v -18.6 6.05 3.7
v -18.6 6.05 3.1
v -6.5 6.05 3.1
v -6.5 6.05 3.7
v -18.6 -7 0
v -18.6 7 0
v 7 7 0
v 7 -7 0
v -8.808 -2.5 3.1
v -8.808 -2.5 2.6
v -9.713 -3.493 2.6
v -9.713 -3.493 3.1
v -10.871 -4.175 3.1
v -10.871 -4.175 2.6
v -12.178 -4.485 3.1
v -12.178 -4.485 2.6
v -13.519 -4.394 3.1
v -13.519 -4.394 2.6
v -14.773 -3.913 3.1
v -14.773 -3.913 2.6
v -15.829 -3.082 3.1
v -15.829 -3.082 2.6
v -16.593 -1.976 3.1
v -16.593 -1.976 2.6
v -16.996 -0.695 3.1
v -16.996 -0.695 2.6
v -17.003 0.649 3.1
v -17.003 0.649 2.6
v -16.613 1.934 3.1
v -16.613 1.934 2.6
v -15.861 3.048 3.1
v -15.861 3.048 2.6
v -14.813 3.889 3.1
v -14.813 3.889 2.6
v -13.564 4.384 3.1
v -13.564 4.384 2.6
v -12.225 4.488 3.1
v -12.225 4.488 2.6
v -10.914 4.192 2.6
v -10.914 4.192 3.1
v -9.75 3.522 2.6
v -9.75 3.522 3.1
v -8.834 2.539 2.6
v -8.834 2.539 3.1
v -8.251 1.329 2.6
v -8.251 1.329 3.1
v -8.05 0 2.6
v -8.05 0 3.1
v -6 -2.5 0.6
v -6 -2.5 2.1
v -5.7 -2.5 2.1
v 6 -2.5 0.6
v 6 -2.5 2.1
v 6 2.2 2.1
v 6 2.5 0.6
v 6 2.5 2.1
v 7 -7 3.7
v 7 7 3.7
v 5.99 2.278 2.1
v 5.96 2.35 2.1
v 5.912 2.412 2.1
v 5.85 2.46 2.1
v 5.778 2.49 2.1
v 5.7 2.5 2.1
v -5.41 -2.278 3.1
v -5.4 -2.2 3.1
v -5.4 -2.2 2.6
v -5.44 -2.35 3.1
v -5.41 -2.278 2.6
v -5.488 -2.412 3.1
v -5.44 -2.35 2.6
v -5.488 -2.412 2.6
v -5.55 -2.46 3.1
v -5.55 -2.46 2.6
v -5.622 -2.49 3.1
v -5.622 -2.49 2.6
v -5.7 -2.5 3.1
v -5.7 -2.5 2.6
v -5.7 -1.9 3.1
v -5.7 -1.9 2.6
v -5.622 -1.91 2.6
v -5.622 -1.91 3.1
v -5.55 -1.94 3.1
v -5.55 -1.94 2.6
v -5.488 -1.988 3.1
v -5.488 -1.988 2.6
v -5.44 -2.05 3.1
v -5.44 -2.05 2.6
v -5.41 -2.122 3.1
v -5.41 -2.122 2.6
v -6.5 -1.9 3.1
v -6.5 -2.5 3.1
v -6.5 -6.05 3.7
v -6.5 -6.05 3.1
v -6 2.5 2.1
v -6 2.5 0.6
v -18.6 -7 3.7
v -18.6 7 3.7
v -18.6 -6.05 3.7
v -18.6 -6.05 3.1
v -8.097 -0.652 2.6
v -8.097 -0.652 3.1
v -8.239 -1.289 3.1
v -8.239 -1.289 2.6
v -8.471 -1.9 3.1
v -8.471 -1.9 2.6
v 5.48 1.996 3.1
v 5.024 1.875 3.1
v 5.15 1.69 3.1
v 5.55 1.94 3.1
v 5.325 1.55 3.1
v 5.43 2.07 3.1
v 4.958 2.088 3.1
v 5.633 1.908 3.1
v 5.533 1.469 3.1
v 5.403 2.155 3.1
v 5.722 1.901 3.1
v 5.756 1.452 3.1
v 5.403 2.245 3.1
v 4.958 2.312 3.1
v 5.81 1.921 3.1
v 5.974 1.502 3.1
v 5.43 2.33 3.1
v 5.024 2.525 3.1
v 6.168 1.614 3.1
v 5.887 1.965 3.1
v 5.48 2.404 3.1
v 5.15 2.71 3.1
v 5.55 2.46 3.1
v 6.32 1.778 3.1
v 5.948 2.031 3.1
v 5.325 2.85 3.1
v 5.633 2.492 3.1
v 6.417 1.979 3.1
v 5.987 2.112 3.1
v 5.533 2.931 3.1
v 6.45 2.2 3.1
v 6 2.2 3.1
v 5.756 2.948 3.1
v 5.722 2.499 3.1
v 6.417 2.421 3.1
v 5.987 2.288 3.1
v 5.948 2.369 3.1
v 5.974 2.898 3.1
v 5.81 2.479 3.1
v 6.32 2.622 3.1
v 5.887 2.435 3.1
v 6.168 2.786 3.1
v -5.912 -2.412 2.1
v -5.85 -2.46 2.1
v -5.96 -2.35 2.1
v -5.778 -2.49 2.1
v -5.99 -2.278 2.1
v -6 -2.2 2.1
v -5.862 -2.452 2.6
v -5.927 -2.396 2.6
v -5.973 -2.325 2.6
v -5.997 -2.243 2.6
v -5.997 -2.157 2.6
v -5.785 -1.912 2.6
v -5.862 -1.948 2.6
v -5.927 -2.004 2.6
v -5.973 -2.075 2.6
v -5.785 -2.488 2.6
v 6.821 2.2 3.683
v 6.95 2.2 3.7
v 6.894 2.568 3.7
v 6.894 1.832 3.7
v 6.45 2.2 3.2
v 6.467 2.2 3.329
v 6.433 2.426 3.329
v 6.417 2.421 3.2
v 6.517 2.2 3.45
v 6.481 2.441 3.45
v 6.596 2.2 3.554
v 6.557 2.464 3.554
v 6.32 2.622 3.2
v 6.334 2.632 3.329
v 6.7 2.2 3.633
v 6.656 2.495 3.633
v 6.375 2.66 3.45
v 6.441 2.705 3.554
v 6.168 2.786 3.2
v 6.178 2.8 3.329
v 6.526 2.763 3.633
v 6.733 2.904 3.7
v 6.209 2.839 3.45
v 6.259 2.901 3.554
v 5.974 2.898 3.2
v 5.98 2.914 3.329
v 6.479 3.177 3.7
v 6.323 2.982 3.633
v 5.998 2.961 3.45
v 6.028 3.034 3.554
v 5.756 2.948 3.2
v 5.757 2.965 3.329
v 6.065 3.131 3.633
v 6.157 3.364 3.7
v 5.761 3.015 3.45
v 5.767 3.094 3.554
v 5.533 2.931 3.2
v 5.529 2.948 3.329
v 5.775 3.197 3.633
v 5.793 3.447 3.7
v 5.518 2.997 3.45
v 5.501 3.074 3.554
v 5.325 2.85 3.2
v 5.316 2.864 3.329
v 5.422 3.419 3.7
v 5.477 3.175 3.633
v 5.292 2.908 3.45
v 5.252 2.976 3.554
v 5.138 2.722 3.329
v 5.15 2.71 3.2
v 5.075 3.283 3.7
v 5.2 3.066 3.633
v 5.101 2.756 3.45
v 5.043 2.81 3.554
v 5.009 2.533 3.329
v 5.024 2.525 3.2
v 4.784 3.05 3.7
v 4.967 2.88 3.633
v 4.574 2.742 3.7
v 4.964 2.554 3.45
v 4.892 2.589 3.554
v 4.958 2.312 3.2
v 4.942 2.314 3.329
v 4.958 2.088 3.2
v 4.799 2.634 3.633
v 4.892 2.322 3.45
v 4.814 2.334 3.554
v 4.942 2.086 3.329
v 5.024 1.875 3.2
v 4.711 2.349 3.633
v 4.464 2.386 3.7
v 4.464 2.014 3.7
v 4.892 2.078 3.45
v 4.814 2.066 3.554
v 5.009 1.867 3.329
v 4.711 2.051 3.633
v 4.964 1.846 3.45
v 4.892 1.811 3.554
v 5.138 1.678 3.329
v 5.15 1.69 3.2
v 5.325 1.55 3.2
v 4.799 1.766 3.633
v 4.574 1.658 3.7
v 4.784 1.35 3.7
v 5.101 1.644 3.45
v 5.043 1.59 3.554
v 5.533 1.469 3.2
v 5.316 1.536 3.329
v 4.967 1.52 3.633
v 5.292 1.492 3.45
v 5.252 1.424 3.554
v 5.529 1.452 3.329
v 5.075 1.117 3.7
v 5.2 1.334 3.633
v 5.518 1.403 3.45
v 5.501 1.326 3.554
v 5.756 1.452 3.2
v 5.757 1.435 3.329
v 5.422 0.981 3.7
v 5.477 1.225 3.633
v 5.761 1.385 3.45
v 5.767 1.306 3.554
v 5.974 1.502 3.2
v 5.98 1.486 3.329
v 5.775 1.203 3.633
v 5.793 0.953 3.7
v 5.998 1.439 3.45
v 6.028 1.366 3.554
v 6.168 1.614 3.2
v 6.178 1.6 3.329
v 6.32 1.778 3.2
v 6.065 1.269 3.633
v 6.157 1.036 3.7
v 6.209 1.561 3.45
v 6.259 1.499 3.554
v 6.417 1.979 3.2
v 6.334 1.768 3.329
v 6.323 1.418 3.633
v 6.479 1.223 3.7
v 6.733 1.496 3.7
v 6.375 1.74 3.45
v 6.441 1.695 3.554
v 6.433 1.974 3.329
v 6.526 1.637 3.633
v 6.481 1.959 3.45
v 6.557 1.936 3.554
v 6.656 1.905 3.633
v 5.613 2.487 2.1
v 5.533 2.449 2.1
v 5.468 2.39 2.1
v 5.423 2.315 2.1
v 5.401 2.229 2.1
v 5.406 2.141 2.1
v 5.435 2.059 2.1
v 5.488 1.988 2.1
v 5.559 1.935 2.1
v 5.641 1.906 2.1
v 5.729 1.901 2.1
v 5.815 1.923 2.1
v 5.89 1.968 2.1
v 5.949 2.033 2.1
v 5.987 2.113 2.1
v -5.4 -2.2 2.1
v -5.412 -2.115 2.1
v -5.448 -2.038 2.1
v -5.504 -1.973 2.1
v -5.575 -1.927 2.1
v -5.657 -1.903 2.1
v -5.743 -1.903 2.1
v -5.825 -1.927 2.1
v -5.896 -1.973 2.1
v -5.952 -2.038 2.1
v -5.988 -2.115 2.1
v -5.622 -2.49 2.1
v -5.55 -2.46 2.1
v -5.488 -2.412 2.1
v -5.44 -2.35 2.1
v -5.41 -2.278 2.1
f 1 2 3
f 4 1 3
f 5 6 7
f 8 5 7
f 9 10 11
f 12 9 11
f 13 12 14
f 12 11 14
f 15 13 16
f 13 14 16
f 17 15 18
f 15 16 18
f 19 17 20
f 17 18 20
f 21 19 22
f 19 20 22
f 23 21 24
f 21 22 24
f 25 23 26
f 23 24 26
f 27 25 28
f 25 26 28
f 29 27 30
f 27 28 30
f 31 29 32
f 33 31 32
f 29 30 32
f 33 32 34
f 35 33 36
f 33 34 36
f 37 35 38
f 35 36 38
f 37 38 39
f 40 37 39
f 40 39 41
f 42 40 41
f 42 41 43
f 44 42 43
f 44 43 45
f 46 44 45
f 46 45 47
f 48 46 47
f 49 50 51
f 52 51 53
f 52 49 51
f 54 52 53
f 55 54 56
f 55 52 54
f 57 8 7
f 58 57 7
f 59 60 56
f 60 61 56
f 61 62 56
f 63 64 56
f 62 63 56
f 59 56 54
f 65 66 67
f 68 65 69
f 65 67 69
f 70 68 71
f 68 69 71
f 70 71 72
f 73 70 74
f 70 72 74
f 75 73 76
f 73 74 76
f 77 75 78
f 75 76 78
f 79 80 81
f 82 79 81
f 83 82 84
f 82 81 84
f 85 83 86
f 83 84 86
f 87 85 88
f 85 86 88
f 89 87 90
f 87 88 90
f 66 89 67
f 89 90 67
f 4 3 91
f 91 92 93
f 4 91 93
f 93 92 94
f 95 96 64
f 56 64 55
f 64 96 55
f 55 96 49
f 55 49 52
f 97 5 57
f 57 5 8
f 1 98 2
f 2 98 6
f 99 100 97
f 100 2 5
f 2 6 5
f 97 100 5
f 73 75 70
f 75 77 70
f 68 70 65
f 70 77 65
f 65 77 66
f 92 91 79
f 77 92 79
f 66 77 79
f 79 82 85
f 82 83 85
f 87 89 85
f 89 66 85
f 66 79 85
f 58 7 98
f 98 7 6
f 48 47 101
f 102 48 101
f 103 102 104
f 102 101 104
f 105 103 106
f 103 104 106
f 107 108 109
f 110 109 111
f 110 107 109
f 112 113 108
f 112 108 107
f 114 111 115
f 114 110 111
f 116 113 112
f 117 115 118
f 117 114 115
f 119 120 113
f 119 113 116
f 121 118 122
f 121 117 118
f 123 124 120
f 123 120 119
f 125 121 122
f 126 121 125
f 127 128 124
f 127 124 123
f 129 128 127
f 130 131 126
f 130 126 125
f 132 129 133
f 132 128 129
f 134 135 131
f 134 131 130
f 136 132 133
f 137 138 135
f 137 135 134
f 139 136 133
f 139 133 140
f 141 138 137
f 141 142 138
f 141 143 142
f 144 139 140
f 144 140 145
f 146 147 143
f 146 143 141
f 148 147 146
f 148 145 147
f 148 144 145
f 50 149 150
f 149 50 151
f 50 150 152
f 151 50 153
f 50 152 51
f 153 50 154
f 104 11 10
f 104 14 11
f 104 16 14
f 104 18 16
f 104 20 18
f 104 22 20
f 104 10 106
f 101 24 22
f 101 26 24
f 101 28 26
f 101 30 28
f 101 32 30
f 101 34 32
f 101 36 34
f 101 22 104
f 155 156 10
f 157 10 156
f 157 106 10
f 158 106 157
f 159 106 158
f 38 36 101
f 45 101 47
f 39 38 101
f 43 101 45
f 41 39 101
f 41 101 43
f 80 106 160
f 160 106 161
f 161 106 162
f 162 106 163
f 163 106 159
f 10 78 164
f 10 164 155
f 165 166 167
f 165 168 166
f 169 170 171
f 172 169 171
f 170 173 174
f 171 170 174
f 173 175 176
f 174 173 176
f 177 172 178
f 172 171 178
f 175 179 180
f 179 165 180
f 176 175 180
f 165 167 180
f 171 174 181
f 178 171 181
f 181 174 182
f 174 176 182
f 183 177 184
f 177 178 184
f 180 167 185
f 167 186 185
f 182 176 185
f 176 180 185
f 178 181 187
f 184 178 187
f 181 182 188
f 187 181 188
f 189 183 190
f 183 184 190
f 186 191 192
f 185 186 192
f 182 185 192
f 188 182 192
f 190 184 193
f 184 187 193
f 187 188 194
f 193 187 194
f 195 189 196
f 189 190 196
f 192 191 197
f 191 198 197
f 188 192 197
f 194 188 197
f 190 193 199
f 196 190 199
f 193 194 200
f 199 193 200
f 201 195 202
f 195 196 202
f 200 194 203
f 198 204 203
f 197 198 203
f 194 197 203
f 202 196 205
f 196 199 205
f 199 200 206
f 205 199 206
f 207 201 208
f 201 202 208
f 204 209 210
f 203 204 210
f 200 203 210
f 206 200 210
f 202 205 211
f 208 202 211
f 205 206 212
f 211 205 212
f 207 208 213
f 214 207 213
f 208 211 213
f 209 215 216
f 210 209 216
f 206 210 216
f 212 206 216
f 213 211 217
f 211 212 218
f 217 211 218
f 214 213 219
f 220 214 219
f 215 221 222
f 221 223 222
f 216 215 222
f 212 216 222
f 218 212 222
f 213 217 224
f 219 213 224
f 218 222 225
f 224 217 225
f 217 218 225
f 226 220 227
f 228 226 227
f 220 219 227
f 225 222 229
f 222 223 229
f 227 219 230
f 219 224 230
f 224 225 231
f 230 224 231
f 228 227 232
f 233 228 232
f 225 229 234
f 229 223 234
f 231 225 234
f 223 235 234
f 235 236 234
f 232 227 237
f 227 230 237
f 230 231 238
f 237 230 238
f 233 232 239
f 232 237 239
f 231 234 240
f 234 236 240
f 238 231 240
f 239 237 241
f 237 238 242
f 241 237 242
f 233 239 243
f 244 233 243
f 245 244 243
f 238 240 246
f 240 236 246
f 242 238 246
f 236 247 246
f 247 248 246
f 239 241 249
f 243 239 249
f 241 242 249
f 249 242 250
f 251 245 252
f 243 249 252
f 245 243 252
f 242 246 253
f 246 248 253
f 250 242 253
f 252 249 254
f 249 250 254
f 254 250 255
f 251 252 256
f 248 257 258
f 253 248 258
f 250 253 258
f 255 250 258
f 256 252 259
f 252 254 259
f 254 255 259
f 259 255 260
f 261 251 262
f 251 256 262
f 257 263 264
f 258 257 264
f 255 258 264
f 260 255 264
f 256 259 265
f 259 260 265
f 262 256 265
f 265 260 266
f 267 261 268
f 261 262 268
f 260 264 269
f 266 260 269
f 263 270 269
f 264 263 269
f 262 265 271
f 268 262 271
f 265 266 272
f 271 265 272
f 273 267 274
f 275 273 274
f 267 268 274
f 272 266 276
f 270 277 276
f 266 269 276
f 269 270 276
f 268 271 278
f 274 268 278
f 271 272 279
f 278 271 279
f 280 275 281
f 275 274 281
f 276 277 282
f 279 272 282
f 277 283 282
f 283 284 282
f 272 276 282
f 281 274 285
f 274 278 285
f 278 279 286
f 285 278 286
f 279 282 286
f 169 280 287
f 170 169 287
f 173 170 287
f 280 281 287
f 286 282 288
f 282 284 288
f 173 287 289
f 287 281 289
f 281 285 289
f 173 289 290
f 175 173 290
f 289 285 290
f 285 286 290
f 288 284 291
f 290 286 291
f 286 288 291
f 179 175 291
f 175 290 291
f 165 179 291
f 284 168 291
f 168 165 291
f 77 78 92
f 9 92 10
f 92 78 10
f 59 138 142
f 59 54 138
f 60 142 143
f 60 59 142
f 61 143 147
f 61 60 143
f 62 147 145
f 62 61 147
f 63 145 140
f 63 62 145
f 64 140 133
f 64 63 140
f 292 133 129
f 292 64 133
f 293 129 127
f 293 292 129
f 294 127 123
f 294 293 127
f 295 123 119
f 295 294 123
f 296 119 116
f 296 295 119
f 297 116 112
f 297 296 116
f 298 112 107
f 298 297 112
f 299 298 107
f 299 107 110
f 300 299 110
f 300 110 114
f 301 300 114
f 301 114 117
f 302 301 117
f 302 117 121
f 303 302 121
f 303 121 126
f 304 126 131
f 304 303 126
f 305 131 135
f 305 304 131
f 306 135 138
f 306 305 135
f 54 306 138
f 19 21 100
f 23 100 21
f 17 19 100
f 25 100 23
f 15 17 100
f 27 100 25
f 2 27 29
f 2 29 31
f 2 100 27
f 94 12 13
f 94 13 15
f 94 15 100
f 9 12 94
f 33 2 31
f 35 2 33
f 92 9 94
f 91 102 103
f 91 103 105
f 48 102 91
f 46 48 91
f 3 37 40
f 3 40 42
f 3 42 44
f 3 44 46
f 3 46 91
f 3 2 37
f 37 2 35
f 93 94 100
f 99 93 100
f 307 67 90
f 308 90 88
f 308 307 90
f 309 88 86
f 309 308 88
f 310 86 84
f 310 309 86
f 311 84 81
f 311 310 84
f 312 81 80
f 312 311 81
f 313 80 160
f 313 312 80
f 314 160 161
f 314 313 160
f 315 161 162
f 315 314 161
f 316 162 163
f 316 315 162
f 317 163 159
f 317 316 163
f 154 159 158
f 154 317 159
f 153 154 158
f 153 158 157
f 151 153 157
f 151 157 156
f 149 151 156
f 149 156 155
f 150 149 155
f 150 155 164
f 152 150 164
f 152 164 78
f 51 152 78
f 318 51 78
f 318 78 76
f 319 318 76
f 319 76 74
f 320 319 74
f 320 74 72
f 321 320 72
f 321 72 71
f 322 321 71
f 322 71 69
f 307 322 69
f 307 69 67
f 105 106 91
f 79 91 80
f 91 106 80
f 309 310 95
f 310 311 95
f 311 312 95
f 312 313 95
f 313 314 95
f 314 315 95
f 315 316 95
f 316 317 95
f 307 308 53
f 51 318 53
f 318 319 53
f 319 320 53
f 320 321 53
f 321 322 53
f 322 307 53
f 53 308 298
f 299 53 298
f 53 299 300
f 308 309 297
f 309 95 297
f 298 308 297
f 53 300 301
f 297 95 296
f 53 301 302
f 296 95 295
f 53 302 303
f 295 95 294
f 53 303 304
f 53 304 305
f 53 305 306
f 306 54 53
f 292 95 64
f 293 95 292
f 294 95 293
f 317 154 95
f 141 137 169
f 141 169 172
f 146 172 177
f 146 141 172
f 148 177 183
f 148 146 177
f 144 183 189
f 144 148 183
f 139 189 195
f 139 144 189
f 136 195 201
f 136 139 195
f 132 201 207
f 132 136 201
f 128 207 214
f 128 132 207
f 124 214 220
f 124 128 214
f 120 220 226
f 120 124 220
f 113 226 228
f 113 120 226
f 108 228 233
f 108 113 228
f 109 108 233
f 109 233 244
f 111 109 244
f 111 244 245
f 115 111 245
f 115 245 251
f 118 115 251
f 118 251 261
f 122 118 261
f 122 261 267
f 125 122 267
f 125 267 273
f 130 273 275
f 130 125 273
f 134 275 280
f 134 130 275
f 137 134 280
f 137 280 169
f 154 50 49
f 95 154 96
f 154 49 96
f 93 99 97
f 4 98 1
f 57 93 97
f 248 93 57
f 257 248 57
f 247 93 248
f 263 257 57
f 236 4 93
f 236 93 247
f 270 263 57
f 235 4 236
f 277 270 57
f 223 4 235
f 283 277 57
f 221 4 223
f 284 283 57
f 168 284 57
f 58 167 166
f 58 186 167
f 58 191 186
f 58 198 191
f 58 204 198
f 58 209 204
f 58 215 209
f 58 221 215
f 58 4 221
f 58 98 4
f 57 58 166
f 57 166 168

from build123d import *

# Parameters (mm, degrees)
F2_DEPTH  = 0.6
F3_W      = 12
F3_H      = 5
F4_DEPTH  = 1.5
F5_R      = 0.3
F6_DEPTH  = 0.5
F7_R      = 0.3
F8_DEPTH  = 0.5
F9_R      = 0.75
F10_DEPTH = 0.6
F11_R     = 0.5


with BuildPart() as f2:
    # F1 (on face) → F2 (new body)
    with BuildSketch(Plane.XY):
        Polygon((7, 7), (-18.6, 7), (-18.6, 6.05), (-18.6, -6.05), (-18.6, -7), (7, -7), align=None)
    extrude(amount=F2_DEPTH)

    # F3 (on face) → F4 (join)
    with BuildSketch(Plane.XY.offset(0.6)):
        Polygon((7, 7), (-18.6, 7), (-18.6, 6.05), (-18.6, -6.05), (-18.6, -7), (7, -7), align=None)
        Rectangle(F3_W, F3_H, mode=Mode.SUBTRACT)
    extrude(amount=F4_DEPTH)

    # F5 (on face) → F6 (join)
    with BuildSketch(Plane.XY.offset(2.1)):
        Polygon((7, 7), (-18.6, 7), (-18.6, 6.05), (-18.6, -6.05), (-18.6, -7), (7, -7), align=None)
        with Locations((-5.7, -2.2)):
            Circle(F5_R, mode=Mode.SUBTRACT)
        with Locations((5.7, 2.2)):
            Circle(F5_R, mode=Mode.SUBTRACT)
    extrude(amount=F6_DEPTH)

    # F7 (on face) → F8 (join)
    with BuildSketch(Plane.XY.offset(2.6)):
        Polygon((7, 7), (-18.6, 7), (-18.6, 6.05), (-18.6, -6.05), (-18.6, -7), (7, -7), align=None)
        with BuildLine():
            ThreePointArc((-5.7, -1.9), (-5.4878679656, -1.9878679656), (-5.4, -2.2))
            ThreePointArc((-5.4, -2.2), (-5.4878679656, -2.4121320344), (-5.7, -2.5))
            Line((-5.7, -2.5), (-8.8083426132, -2.5))
            ThreePointArc((-8.8083426132, -2.5), (-16.8562430401, 1.3062430401), (-8.05, 0))
            ThreePointArc((-8.05, 0), (-8.1564552894, -0.9730184354), (-8.4707843891, -1.9))
            Line((-8.4707843891, -1.9), (-5.7, -1.9))
        make_face(mode=Mode.SUBTRACT)
        with Locations((5.7, 2.2)):
            Circle(F7_R, mode=Mode.SUBTRACT)
    extrude(amount=F8_DEPTH)

    # F9 (on face) → F10 (join)
    with BuildSketch(Plane.XY.offset(3.1)):
        Polygon((7, 7), (-18.6, 7), (-18.6, 6.05), (-6.5, 6.05), (-6.5, -6.05), (-18.6, -6.05), (-18.6, -7), (7, -7), align=None)
        with Locations((5.7, 2.2)):
            Circle(F9_R, mode=Mode.SUBTRACT)
    extrude(amount=F10_DEPTH)

    # F11
    f11_edges = [f2.edges().sort_by_distance(p)[0] for p in [
        (4.95, 2.2, 3.7),
    ]]
    fillet(f11_edges, radius=F11_R)


solid = f2.part
